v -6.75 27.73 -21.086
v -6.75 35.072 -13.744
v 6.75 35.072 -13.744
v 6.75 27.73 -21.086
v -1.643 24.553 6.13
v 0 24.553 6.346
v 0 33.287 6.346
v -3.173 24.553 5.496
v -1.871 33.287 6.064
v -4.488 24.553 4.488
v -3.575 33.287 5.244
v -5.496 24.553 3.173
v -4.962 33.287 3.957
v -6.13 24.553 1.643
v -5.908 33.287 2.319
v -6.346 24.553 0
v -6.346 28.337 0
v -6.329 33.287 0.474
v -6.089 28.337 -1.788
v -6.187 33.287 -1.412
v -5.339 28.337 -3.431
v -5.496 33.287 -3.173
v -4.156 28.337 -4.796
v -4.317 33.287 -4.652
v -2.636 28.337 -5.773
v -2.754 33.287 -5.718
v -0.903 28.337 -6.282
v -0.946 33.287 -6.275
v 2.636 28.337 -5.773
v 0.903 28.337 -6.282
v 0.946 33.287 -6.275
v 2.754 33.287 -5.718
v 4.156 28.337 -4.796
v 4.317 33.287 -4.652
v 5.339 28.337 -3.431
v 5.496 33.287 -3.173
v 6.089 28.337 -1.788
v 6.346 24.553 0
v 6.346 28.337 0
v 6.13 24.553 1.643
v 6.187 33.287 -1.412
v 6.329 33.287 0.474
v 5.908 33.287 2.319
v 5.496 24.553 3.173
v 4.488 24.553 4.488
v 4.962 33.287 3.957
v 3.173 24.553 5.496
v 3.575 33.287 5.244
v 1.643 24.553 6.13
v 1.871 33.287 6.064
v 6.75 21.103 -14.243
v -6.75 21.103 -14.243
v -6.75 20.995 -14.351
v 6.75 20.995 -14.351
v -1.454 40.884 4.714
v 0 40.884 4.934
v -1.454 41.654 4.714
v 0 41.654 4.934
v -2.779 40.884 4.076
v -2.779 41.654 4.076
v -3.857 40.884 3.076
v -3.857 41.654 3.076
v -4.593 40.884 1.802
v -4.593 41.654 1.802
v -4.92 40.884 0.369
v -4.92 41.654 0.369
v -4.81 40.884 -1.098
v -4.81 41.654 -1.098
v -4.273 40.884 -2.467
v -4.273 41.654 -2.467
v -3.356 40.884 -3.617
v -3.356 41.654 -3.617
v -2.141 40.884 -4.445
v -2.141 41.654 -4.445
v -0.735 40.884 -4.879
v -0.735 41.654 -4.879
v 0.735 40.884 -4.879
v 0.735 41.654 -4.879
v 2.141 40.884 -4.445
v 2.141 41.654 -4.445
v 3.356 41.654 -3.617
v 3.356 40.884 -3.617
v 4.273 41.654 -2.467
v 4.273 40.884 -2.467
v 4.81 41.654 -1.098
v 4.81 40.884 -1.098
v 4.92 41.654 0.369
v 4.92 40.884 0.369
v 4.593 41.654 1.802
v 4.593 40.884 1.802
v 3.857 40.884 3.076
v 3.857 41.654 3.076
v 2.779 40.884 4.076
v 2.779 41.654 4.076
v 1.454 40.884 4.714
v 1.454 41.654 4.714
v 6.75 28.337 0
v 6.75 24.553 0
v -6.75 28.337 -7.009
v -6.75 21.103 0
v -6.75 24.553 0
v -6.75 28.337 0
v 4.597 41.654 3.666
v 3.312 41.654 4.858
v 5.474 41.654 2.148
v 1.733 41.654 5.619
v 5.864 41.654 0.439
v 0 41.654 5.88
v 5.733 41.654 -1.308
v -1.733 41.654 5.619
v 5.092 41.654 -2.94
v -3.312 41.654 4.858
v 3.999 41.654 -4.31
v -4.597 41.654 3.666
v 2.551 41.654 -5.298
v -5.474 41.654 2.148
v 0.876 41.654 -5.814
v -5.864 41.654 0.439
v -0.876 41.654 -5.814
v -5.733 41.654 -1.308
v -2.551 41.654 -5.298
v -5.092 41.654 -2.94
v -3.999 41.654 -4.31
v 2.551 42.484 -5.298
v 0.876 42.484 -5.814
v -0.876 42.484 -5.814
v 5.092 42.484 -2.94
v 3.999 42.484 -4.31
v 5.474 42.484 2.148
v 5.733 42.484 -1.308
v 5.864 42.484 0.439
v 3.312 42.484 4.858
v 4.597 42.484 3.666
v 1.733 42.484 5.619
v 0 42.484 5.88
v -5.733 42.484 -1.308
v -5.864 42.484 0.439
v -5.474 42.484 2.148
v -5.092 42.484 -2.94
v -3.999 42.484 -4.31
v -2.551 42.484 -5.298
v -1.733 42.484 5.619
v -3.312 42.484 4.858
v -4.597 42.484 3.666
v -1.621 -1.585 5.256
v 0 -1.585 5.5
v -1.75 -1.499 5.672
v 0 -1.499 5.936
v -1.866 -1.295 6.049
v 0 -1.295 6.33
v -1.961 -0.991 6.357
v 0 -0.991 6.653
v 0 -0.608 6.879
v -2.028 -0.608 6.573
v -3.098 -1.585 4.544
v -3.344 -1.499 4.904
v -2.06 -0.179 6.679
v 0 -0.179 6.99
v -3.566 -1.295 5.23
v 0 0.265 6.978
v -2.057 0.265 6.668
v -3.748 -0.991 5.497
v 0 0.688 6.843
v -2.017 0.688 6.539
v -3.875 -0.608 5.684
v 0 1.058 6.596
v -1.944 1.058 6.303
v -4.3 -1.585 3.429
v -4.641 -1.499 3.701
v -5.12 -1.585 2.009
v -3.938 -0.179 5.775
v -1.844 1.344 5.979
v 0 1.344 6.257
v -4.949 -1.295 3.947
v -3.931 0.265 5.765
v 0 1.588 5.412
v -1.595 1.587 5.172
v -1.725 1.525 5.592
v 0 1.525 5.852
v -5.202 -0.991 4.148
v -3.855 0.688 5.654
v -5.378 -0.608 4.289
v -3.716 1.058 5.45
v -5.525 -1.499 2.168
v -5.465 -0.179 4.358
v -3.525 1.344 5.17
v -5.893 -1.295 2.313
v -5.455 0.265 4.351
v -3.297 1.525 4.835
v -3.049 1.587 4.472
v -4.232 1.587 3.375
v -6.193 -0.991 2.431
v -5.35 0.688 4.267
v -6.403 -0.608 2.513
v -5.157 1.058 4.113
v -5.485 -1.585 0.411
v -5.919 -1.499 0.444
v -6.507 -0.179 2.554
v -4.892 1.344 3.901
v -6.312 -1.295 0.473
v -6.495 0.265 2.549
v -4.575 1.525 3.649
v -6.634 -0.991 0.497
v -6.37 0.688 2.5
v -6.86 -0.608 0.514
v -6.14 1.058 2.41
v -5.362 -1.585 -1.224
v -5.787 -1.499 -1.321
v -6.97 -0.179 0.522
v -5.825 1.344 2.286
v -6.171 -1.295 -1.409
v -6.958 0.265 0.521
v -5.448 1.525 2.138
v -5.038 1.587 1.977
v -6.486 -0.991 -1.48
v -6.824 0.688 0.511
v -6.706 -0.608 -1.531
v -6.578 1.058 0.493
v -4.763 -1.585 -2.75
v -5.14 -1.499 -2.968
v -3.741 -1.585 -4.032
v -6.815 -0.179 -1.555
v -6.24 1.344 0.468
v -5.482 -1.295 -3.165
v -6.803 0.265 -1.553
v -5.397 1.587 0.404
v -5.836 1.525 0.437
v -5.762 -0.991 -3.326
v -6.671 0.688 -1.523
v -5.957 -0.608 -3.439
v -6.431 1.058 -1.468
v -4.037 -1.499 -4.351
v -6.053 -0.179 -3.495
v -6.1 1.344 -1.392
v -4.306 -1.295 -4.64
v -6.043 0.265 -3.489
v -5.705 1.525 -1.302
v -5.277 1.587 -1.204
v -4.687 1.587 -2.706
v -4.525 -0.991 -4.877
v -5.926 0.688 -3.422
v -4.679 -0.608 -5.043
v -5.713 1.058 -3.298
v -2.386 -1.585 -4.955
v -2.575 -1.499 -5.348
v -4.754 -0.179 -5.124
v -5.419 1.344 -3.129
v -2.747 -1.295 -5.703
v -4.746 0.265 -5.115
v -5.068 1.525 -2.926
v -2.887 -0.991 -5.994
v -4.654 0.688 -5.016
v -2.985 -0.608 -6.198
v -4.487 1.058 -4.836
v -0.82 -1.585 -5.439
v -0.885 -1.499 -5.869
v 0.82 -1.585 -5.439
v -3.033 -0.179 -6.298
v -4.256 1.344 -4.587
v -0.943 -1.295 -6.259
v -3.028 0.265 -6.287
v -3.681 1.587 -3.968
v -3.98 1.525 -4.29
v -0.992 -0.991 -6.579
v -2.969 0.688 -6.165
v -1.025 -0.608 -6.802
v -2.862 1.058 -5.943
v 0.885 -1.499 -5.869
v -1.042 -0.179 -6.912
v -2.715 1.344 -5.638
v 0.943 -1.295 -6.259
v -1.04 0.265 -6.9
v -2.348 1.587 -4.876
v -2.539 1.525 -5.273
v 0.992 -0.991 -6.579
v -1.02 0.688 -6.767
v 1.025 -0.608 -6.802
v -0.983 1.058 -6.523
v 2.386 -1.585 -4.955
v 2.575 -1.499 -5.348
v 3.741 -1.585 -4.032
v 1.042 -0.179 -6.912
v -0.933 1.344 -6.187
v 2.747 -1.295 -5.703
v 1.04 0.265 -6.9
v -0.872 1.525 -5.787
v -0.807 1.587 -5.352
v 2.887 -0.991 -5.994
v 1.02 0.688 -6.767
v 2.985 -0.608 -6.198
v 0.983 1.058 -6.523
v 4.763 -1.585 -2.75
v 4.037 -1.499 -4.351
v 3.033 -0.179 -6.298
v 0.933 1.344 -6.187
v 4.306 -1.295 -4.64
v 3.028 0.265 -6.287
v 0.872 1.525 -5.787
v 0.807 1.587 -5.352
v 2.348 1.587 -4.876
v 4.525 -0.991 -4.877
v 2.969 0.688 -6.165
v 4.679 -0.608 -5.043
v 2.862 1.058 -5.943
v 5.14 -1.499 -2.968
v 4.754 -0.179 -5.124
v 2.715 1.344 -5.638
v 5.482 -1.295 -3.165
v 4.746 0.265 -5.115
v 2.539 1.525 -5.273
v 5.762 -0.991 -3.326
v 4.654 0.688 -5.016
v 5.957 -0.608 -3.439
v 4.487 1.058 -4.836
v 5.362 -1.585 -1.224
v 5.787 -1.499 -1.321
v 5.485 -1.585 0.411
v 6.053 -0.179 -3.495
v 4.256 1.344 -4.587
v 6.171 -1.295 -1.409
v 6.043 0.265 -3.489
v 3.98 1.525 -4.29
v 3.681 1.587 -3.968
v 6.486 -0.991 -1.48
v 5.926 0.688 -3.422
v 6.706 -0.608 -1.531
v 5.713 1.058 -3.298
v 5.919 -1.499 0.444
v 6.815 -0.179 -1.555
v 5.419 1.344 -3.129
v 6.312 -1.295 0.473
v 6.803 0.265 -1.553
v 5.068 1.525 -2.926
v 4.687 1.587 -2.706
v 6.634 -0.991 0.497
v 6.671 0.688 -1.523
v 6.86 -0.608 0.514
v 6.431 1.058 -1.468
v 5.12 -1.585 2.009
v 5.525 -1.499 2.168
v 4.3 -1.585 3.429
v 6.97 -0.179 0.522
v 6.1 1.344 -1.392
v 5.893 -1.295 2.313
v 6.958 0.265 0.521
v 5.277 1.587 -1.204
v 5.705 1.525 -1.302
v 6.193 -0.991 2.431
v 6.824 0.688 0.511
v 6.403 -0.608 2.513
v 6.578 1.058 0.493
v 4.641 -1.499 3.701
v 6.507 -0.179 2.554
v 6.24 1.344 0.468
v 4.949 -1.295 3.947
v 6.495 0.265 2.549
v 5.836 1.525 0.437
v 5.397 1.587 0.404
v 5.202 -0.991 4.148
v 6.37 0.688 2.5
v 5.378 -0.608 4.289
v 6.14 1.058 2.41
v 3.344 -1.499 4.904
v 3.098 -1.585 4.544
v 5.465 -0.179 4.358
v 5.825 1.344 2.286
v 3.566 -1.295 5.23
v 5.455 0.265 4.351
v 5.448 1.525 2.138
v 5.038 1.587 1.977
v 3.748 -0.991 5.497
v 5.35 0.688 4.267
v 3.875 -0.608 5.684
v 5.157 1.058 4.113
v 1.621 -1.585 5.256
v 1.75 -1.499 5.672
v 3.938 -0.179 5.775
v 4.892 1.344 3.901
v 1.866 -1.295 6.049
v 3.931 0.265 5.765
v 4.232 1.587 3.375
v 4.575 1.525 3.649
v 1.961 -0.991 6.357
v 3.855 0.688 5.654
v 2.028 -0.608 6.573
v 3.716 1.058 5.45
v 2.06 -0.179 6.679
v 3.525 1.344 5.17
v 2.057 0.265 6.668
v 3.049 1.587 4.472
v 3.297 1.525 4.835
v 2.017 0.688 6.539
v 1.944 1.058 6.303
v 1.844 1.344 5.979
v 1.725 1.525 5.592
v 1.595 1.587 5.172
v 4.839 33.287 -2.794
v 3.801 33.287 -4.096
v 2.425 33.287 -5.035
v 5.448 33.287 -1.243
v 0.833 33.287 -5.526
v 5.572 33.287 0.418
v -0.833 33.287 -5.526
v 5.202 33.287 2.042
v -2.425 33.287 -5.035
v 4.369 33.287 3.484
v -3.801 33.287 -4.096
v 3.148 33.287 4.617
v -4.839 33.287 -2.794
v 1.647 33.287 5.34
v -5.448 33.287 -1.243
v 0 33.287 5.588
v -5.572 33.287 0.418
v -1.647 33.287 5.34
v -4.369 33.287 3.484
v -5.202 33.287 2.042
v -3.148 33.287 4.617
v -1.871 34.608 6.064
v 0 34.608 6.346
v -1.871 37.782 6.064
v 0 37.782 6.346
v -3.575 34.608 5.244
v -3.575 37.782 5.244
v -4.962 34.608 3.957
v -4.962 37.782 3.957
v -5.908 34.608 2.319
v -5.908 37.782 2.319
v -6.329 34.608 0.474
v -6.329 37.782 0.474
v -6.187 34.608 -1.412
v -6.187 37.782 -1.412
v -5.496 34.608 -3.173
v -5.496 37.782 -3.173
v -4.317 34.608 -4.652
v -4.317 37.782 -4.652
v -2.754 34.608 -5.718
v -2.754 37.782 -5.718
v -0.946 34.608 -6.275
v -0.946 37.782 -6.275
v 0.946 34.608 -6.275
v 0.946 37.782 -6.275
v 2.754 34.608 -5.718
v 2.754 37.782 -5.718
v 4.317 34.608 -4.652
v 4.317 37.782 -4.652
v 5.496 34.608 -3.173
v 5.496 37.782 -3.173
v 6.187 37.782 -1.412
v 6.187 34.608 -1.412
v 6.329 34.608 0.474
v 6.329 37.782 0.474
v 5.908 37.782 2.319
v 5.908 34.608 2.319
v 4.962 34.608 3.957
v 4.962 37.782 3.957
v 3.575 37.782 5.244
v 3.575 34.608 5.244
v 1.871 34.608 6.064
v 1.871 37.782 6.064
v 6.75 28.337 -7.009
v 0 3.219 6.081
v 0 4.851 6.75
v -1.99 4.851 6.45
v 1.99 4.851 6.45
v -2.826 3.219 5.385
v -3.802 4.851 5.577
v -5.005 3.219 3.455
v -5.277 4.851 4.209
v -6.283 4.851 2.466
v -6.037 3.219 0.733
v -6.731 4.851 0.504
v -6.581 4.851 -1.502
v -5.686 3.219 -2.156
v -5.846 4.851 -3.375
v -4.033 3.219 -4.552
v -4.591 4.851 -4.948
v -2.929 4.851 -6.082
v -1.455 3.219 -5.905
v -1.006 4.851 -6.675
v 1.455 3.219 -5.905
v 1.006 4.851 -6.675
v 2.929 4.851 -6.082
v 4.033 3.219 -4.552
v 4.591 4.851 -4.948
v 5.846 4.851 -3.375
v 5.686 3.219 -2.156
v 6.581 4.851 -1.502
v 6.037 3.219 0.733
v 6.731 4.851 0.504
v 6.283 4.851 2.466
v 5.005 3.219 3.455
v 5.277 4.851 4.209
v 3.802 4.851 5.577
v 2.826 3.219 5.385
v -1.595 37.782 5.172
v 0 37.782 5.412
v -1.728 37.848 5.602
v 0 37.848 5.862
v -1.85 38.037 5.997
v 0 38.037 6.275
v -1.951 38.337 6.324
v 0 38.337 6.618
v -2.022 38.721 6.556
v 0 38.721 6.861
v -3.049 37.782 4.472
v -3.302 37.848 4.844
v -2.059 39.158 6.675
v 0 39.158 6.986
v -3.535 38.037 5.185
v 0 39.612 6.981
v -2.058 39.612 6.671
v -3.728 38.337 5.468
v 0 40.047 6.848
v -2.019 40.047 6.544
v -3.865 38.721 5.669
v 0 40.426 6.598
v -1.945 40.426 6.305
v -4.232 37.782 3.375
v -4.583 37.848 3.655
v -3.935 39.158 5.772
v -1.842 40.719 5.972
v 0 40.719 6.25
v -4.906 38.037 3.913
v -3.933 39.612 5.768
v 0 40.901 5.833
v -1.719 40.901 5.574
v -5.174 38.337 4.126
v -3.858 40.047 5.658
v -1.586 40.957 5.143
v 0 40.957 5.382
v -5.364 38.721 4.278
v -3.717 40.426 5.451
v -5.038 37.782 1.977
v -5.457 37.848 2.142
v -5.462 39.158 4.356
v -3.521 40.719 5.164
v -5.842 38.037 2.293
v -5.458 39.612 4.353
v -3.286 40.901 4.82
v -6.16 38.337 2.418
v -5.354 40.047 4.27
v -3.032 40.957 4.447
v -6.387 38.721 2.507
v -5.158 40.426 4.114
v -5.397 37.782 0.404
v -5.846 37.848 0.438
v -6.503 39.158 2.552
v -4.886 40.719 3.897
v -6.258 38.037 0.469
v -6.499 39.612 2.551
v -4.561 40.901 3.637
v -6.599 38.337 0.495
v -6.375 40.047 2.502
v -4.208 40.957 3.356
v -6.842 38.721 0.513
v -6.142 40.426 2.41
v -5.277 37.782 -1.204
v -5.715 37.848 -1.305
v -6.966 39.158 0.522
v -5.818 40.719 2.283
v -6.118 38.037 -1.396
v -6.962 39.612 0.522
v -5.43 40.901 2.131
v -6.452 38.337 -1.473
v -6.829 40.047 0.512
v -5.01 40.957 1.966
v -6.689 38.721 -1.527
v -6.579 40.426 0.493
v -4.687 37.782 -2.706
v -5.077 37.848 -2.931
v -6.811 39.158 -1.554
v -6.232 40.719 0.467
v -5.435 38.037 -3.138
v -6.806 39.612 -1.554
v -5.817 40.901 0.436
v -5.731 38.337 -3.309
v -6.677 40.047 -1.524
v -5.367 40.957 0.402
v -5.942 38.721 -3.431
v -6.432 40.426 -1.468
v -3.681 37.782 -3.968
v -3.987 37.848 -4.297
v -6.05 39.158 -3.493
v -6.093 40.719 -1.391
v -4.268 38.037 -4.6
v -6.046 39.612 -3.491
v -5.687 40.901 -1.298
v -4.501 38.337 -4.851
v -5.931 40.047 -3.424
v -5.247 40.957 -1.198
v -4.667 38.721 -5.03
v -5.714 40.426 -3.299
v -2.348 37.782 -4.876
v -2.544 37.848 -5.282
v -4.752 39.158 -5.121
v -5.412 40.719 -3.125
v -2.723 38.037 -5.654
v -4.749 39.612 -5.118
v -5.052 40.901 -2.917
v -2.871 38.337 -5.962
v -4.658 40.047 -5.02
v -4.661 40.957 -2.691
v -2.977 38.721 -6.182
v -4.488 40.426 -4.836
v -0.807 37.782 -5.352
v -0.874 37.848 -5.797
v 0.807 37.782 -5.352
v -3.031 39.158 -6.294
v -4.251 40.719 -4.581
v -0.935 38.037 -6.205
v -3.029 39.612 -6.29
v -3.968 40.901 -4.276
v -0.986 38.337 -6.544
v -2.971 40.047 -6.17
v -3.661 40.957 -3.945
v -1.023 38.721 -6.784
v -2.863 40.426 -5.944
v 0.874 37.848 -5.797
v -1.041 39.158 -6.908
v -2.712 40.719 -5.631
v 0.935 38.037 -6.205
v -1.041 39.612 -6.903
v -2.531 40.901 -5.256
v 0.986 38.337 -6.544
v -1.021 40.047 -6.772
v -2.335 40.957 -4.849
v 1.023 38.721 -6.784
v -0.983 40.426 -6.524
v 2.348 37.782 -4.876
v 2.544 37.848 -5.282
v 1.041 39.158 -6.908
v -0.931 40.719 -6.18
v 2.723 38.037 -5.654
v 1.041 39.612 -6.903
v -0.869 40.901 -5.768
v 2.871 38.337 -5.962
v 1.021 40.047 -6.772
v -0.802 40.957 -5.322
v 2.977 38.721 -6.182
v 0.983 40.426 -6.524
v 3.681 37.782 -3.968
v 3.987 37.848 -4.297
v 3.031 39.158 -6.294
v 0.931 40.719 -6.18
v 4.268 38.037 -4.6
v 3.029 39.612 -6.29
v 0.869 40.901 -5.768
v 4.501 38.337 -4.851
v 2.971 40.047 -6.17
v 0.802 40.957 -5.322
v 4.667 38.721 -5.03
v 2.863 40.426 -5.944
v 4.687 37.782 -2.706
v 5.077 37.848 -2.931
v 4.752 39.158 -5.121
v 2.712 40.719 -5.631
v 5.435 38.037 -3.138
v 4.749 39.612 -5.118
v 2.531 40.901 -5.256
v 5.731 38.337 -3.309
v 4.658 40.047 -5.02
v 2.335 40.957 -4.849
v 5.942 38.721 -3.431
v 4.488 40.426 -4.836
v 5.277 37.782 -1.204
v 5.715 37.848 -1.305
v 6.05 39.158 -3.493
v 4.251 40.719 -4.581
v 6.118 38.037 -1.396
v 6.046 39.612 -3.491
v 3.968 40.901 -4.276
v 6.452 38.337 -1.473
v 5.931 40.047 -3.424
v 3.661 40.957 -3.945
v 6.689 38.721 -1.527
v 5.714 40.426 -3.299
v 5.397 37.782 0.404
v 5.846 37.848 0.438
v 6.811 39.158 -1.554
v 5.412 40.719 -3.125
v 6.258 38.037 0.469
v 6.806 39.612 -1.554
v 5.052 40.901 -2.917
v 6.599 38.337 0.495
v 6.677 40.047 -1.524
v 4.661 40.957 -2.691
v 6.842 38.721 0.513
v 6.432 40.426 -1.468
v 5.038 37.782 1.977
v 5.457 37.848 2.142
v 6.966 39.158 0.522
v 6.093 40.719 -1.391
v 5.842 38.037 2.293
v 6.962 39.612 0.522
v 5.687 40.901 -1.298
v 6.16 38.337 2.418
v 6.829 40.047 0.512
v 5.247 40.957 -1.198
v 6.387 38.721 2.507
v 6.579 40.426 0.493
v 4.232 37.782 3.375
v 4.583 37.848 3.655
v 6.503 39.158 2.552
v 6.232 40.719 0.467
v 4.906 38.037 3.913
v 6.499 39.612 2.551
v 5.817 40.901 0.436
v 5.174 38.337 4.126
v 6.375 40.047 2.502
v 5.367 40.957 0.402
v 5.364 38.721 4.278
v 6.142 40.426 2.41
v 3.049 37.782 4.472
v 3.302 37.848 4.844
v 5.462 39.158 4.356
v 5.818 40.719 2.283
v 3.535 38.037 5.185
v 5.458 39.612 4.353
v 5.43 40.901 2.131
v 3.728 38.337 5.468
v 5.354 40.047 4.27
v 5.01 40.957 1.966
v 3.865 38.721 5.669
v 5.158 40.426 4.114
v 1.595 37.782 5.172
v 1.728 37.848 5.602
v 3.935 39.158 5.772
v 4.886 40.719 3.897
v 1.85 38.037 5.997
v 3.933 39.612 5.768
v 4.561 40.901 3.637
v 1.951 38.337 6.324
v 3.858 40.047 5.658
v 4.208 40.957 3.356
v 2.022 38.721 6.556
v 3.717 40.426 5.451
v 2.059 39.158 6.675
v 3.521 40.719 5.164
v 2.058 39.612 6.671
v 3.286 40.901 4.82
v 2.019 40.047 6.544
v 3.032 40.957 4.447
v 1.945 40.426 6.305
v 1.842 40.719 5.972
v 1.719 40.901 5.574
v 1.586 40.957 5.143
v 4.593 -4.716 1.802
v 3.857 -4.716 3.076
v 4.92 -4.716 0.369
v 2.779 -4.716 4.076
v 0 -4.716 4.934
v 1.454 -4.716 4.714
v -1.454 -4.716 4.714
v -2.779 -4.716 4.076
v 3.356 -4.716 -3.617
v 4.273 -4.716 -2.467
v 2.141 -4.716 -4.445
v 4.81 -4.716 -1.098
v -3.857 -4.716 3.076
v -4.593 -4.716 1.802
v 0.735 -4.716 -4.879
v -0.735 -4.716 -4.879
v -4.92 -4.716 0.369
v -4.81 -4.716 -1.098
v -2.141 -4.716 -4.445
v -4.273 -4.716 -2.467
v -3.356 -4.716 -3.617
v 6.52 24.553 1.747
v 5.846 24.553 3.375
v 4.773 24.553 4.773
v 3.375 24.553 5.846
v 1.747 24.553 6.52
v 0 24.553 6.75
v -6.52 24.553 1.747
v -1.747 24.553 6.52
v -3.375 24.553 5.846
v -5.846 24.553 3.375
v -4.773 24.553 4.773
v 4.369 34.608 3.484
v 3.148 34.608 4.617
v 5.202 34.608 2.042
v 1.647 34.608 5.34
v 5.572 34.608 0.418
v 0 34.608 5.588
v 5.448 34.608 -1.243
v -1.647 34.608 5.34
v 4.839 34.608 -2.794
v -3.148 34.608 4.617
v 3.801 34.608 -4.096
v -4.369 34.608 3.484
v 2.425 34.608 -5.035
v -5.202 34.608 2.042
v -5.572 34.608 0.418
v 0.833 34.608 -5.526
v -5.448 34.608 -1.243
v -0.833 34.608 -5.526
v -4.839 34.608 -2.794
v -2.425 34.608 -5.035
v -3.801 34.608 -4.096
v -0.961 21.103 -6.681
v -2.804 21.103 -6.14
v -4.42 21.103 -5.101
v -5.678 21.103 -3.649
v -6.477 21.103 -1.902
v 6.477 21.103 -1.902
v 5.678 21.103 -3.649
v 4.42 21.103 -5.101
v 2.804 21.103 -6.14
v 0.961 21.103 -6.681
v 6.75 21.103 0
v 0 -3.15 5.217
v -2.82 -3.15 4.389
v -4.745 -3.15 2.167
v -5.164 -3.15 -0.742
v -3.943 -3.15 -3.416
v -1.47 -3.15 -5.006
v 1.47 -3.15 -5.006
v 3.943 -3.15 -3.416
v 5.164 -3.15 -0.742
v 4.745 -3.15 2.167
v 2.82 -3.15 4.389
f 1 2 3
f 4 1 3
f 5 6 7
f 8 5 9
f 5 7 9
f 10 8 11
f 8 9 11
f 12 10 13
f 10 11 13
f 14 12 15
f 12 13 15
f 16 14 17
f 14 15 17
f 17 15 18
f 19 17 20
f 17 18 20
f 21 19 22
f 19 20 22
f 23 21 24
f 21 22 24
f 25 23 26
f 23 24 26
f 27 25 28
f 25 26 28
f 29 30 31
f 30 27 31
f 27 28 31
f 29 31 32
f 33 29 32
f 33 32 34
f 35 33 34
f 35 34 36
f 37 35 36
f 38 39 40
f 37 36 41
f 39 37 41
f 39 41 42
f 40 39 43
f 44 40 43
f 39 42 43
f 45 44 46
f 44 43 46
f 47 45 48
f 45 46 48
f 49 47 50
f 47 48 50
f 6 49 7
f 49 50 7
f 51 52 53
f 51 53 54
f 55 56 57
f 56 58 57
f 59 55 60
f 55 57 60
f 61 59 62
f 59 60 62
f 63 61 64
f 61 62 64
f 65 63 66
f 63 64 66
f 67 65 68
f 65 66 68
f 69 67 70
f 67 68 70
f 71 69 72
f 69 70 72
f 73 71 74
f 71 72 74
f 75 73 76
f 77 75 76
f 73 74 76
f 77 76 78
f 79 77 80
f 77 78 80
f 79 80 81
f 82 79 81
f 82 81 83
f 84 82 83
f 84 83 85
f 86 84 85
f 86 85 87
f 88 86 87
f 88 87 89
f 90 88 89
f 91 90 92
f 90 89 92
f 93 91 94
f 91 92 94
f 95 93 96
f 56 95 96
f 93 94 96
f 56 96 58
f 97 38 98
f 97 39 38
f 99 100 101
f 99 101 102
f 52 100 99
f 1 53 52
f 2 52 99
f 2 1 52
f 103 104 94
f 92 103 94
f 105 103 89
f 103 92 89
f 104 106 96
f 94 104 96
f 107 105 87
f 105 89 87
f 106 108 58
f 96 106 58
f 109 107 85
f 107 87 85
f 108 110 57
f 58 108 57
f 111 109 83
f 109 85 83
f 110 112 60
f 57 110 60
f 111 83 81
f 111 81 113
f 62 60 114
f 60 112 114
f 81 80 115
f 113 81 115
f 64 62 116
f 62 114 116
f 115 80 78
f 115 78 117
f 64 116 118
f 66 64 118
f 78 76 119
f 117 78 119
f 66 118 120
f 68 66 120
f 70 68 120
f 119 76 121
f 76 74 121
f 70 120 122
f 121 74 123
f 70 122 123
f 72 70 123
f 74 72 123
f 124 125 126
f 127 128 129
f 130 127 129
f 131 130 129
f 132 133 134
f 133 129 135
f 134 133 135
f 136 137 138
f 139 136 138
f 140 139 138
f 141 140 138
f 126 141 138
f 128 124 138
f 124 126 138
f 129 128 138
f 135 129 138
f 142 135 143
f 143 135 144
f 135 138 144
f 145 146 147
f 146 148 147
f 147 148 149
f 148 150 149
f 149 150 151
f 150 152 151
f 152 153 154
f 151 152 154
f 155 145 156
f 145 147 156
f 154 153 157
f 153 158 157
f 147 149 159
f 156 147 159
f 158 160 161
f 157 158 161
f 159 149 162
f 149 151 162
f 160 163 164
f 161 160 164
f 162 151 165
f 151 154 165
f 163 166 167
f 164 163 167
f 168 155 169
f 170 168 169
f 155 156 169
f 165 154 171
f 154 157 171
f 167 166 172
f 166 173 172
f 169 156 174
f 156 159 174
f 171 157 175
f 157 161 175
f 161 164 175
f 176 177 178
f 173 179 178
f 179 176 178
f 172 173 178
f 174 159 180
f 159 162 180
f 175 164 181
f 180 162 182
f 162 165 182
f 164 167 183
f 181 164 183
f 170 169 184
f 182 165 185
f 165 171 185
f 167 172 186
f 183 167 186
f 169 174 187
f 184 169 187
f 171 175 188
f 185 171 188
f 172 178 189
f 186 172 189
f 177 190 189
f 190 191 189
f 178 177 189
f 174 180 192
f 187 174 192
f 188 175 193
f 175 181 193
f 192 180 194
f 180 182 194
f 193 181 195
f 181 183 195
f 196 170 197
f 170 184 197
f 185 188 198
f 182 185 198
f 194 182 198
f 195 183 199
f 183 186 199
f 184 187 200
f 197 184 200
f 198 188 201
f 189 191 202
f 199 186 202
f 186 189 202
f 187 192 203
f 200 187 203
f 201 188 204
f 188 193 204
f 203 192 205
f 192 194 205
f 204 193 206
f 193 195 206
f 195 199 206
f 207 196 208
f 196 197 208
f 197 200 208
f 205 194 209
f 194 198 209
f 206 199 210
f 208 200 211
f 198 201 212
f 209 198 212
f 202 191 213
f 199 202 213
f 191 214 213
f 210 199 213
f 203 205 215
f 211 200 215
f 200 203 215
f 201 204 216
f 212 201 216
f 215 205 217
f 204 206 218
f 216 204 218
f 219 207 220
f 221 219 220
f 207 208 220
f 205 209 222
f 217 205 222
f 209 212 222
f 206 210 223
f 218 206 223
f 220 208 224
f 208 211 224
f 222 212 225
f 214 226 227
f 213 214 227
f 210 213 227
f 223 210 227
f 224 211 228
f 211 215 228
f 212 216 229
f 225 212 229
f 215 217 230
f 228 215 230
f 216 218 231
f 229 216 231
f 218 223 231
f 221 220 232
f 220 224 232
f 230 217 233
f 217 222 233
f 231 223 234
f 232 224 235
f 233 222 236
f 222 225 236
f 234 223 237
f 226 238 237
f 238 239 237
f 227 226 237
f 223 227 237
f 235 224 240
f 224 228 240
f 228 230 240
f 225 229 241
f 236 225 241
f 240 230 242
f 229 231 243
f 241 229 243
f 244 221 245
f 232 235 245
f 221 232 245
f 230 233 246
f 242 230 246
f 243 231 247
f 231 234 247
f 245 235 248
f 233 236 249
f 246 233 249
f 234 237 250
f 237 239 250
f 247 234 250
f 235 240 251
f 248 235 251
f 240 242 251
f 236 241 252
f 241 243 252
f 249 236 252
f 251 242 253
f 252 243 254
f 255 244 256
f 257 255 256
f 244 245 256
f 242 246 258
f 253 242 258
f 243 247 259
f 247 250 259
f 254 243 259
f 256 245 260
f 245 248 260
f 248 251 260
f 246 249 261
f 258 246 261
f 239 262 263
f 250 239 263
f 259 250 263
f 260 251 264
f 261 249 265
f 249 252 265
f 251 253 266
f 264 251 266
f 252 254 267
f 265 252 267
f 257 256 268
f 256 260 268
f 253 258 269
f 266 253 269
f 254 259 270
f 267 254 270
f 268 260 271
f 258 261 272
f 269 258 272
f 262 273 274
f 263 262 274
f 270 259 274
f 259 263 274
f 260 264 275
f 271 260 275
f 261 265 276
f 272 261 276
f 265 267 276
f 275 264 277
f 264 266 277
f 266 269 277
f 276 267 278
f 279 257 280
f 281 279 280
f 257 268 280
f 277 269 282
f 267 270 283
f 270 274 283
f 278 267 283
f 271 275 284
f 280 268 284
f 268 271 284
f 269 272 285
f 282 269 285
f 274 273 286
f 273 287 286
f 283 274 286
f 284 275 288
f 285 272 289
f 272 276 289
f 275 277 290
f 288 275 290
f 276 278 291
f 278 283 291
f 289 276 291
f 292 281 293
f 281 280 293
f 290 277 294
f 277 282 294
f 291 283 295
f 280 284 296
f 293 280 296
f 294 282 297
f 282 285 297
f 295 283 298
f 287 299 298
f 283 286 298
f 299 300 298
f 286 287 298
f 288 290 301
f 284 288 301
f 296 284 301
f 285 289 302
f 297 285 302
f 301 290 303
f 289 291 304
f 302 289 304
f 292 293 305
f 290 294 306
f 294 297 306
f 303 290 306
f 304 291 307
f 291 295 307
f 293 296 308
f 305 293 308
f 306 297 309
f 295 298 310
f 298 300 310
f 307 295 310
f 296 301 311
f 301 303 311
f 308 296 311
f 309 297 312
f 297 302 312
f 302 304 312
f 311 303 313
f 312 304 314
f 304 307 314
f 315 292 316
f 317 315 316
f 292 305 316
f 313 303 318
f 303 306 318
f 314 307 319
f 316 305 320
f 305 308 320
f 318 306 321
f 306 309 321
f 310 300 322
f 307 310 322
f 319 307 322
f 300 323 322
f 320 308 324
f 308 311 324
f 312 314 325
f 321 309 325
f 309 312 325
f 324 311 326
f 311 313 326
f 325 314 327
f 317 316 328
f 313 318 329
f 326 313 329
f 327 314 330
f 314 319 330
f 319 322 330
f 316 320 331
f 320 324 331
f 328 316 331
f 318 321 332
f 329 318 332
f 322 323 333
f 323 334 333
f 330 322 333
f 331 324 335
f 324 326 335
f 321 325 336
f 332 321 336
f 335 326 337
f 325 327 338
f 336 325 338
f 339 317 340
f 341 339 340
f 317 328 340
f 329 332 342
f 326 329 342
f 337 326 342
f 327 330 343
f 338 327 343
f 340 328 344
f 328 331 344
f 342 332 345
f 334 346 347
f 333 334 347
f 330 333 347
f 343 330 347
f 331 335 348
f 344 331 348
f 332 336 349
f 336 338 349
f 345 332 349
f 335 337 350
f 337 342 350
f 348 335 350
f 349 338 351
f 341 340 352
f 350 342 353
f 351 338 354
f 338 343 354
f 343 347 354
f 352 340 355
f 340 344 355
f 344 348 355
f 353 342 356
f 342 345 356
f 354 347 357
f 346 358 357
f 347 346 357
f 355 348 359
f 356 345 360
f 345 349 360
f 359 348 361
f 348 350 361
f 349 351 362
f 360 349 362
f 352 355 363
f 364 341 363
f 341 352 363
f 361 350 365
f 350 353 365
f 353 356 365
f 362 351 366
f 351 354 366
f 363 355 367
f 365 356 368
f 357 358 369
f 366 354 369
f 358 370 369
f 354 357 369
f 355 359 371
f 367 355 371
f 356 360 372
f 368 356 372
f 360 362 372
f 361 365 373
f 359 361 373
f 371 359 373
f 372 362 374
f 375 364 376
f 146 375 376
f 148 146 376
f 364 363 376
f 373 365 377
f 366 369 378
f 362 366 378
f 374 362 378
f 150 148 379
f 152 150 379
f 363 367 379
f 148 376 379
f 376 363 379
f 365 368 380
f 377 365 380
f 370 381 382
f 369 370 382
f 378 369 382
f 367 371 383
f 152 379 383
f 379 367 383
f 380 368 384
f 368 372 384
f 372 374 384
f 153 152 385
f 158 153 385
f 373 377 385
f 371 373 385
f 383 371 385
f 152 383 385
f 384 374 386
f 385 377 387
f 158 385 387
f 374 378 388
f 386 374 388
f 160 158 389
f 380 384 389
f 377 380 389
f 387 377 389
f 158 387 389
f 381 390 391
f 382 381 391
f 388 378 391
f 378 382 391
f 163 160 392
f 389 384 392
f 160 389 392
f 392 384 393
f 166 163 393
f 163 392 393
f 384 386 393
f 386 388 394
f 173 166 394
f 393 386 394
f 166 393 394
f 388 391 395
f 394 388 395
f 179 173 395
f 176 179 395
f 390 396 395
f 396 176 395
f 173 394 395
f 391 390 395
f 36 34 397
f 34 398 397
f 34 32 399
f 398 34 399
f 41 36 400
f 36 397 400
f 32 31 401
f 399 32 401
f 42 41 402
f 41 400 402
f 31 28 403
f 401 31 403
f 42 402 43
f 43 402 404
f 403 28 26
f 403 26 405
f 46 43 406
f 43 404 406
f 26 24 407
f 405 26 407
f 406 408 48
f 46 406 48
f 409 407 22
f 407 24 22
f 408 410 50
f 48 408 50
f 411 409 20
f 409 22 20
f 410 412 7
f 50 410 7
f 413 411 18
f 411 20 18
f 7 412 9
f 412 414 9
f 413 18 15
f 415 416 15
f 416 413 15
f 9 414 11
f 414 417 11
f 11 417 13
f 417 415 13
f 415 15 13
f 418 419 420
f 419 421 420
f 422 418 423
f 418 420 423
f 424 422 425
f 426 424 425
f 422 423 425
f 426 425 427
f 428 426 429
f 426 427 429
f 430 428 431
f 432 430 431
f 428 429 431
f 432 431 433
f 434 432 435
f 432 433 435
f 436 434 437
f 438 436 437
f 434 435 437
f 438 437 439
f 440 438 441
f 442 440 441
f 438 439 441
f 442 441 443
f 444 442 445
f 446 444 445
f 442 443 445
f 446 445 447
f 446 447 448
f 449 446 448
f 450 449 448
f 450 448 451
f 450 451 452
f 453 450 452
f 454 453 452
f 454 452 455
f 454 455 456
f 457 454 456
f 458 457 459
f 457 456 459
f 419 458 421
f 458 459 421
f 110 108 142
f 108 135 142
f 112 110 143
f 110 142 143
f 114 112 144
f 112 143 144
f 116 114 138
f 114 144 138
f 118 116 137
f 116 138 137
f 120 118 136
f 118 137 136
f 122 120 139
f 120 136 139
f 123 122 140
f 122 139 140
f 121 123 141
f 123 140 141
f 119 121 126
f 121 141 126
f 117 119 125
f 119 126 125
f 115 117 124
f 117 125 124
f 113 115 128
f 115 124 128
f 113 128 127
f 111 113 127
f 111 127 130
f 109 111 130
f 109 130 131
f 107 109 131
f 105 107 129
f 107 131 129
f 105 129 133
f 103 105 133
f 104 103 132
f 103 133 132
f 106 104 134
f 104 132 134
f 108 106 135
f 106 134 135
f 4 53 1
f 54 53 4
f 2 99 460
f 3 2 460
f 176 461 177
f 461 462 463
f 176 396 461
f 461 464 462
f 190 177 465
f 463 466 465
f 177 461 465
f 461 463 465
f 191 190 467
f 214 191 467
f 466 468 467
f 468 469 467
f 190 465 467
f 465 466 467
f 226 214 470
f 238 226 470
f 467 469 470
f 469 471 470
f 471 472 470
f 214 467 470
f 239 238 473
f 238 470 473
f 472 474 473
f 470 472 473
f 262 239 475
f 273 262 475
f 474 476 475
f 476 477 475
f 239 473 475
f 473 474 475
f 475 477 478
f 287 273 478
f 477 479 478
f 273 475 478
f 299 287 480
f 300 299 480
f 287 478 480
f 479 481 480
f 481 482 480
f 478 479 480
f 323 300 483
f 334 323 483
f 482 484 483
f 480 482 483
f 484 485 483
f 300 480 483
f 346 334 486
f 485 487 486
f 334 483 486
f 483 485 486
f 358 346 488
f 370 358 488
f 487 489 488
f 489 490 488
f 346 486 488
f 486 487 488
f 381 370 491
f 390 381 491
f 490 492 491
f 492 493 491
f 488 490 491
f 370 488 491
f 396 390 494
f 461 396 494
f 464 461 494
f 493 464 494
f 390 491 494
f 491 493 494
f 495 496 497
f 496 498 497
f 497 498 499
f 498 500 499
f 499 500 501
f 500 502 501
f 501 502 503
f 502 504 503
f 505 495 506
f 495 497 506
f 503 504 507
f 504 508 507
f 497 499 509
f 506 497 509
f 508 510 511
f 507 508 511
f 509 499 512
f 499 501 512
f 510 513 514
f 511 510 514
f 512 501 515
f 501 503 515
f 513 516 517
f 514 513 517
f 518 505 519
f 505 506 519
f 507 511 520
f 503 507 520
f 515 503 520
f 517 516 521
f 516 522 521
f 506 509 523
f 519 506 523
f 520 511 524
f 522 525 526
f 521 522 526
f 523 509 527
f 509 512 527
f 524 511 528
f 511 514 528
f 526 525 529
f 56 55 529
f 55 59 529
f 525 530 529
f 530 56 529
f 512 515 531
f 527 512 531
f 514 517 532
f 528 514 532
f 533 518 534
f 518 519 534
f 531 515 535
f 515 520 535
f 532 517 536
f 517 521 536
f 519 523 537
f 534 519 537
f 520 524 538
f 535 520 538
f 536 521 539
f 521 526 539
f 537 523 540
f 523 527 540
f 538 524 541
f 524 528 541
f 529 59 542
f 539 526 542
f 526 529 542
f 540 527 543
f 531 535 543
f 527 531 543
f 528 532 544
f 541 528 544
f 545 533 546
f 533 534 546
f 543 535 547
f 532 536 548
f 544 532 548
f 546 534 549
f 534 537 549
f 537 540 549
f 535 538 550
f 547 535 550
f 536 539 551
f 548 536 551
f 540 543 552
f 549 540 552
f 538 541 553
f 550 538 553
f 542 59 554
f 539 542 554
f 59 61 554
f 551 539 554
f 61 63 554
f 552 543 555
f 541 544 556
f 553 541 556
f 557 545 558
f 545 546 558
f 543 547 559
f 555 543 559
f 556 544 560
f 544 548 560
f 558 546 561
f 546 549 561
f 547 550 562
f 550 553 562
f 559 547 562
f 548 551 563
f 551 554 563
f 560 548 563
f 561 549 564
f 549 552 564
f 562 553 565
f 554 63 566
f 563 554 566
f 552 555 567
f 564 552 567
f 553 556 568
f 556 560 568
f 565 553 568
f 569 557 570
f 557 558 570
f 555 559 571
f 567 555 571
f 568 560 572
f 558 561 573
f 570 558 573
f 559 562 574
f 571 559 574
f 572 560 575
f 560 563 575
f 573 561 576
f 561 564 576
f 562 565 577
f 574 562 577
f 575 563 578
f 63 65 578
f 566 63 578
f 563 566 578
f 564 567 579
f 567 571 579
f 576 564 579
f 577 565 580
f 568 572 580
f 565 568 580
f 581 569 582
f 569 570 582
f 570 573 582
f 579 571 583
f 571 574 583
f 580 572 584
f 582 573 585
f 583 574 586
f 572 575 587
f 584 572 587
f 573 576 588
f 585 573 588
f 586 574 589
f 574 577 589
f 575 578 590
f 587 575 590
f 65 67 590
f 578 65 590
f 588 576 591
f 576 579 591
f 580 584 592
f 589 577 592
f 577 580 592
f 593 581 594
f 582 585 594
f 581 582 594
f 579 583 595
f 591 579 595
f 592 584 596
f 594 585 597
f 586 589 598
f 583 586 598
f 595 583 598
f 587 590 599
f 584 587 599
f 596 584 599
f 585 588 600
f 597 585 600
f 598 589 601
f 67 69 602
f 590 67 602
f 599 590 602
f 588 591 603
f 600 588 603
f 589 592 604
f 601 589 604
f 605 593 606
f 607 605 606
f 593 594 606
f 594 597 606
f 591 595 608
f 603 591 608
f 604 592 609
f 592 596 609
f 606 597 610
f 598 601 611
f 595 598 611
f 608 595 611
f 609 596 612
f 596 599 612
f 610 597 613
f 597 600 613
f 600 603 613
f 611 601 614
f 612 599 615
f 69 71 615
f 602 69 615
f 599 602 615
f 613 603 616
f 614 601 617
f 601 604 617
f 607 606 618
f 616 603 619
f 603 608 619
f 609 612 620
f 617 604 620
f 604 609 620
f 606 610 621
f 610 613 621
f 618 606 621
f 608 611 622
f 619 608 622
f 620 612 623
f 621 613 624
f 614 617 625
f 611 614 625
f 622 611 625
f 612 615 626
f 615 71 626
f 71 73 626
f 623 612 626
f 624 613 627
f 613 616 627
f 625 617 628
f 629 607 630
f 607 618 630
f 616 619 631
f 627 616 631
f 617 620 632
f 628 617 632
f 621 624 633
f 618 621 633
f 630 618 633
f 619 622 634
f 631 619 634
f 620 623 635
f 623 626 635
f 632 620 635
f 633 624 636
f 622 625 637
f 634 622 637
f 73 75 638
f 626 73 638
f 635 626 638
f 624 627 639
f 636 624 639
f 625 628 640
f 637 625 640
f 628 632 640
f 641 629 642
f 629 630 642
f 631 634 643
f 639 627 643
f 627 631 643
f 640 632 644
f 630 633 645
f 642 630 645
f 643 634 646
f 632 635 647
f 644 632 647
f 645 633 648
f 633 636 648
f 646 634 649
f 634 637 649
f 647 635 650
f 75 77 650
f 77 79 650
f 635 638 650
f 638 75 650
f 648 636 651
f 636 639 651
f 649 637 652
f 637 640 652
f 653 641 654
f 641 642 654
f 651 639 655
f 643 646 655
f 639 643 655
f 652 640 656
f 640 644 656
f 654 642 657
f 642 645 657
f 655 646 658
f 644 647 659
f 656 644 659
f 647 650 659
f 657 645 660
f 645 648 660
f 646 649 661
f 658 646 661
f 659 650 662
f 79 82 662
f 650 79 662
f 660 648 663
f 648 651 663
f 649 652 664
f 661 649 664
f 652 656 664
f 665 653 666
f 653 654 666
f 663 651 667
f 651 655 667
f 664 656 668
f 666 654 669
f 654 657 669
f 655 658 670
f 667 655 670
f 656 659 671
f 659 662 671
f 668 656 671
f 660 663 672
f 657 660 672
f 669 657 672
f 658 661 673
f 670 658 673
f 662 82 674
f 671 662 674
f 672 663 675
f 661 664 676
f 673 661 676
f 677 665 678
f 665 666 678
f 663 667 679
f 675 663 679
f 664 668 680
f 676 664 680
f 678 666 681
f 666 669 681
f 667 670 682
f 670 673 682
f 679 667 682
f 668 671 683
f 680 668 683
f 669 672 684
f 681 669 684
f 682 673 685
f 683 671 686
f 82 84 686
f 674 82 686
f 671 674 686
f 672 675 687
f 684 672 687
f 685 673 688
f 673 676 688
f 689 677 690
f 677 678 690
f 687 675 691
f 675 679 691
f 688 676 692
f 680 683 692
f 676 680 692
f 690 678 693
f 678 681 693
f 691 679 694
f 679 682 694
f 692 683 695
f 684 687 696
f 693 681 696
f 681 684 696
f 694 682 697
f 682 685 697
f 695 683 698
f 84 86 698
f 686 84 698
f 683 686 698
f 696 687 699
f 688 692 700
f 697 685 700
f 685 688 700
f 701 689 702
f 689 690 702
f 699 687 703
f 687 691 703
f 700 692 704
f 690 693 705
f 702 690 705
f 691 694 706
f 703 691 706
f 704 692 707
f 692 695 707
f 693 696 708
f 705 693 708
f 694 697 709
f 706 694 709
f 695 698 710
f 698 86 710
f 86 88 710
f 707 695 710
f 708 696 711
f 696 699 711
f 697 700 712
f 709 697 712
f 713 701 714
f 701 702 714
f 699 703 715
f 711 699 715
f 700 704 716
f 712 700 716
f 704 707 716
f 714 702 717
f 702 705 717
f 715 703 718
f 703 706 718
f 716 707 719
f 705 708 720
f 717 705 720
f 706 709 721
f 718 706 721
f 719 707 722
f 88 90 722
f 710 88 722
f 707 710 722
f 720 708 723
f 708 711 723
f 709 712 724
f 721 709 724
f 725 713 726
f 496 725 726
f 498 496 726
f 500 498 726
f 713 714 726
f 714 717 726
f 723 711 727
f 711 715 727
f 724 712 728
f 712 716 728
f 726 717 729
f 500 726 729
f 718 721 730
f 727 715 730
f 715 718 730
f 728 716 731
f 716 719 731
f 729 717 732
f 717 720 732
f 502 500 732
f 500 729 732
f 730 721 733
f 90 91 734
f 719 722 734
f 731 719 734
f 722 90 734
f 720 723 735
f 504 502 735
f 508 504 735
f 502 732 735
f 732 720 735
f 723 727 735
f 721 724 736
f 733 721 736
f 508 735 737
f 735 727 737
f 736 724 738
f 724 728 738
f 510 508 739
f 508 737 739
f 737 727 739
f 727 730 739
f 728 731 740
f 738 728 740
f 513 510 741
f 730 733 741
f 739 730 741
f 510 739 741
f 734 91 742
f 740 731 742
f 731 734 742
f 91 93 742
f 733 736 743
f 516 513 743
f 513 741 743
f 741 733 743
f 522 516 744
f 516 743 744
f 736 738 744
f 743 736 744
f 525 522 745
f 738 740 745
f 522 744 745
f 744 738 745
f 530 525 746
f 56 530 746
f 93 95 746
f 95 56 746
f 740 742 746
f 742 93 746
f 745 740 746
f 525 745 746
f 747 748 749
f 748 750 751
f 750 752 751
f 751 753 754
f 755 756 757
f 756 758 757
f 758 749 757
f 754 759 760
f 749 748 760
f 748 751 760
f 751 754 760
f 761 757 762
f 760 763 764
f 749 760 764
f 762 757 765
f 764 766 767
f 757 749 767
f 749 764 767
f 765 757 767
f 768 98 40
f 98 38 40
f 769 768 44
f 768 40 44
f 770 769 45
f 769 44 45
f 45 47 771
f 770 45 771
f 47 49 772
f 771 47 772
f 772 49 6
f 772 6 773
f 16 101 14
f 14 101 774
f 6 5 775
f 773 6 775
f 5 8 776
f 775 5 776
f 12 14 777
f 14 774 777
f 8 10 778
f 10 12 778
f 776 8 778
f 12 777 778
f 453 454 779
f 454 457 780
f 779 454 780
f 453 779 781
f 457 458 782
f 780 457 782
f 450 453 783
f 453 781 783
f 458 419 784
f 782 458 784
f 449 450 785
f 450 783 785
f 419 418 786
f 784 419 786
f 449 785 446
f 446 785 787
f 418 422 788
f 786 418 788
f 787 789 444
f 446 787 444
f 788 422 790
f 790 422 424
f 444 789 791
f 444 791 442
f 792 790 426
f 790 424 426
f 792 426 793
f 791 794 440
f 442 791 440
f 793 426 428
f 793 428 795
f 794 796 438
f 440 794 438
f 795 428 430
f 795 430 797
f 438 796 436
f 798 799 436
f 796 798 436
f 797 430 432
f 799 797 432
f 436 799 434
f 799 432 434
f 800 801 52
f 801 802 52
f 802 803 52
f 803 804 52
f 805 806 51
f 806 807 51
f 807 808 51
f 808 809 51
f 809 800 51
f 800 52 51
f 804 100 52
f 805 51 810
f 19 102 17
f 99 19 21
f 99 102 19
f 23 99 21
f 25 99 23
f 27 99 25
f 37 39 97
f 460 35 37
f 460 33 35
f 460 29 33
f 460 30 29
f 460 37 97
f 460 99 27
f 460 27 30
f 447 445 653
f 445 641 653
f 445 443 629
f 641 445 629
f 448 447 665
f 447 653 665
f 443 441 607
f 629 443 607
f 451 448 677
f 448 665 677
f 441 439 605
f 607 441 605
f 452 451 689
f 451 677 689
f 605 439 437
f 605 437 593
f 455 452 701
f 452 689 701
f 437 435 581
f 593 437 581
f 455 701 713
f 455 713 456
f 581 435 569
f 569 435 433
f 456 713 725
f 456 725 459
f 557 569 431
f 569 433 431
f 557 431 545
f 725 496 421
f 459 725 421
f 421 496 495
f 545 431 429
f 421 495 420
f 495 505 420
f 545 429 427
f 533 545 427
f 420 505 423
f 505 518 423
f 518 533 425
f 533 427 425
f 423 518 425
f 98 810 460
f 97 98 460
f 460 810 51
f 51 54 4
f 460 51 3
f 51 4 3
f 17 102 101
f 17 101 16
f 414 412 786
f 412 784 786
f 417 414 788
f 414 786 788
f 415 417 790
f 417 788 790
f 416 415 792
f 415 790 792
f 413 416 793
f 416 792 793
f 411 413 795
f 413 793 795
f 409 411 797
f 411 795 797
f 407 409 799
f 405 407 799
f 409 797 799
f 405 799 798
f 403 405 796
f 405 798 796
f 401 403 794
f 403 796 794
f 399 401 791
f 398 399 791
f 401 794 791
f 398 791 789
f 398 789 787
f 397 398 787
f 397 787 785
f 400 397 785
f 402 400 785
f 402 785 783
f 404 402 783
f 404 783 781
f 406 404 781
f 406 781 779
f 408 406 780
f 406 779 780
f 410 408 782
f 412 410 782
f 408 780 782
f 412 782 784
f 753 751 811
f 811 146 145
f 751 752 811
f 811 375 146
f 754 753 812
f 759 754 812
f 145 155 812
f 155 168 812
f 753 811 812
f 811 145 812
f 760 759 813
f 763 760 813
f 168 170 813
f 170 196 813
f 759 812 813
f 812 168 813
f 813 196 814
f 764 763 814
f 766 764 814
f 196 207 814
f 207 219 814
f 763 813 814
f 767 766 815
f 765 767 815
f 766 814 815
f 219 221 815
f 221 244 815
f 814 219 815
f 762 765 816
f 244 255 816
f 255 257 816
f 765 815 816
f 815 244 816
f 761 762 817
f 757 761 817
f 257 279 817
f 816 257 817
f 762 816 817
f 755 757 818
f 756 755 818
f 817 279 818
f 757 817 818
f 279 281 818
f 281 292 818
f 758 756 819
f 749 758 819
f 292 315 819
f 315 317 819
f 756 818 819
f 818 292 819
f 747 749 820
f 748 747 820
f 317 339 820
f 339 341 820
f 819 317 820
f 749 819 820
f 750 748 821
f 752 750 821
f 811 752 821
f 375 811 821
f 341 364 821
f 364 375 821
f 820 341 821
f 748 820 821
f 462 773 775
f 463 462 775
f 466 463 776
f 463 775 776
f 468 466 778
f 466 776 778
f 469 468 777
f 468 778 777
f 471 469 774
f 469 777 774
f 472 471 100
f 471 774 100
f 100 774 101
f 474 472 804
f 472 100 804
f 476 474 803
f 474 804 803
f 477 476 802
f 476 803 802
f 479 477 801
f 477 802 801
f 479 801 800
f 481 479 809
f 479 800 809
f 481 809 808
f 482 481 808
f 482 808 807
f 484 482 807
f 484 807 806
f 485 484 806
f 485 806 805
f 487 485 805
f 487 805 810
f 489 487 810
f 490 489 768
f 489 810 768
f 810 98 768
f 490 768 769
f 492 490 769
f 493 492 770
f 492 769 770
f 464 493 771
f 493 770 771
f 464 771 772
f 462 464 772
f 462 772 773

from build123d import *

# Parameters (mm, degrees)
SKETCH3_W           = 13.5
SKETCH3_H           = 10.382914324
BOSS_EXTRUDE1_DEPTH = 9.525
BOSS_EXTRUDE2_START = -14.243138
SKETCH4_W           = 13.5
SKETCH4_H           = 7.234030804
BOSS_EXTRUDE2_DEPTH = 14.243138


with BuildPart() as part:
    # Sketch1 → Revolve1 (revolve)
    with BuildSketch(Plane(origin=(0, 0, 0), x_dir=(0, 0, -1), z_dir=(1, 0, 0))):
        with BuildLine():
            Line((0, 42.48431703), (0, -4.71568297))
            Line((0, -4.71568297), (-4.933645932, -4.71568297))
            Line((-4.933645932, -4.71568297), (-5.5, -1.585086748))
            ThreePointArc((-5.5, -1.585086748), (-6.999396572, 0.043766636), (-5.4125, 1.5875))
            Line((-5.4125, 1.5875), (-6.75, 4.851437808))
            Line((-6.75, 4.851437808), (-6.75, 24.552512087))
            Line((-6.75, 24.552512087), (-6.346345985, 24.552512087))
            Line((-6.346345985, 24.552512087), (-6.346345985, 33.2867))
            Line((-6.346345985, 33.2867), (-5.588, 33.2867))
            Line((-5.588, 33.2867), (-5.588, 34.6075))
            Line((-5.588, 34.6075), (-6.346345985, 34.6075))
            Line((-6.346345985, 34.6075), (-6.346345985, 37.7825))
            Line((-6.346345985, 37.7825), (-5.4125, 37.7825))
            ThreePointArc((-5.4125, 37.7825), (-6.981405369, 39.612264718), (-4.933645932, 40.883557079))
            Line((-4.933645932, 40.883557079), (-4.933645932, 41.654223502))
            Line((-4.933645932, 41.654223502), (-5.880026524, 41.654223502))
            Line((-5.880026524, 41.654223502), (-5.880026524, 42.48431703))
            Line((-5.880026524, 42.48431703), (0, 42.48431703))
        make_face()
    revolve(axis=Axis((0, 42.48431703, 0), (0, -1, 0)))



with BuildPart() as body_2:
    # Sketch3 → Boss-Extrude1 (new body)
    with BuildSketch(Plane(origin=(0, 17.673005927, -17.673005927), x_dir=(1, 0, 0), z_dir=(0, -0.707106781, 0.707106781))):
        with Locations((0, 9.889573108)):
            Rectangle(SKETCH3_W, SKETCH3_H)
    extrude(amount=-BOSS_EXTRUDE1_DEPTH)


with BuildPart() as part_1:
    add(part.part)

    add(body_2.part)  # Boss-Extrude2 merges body 2
    # Sketch4 → Boss-Extrude2 (add)
    with BuildSketch(Plane.XY.offset(BOSS_EXTRUDE2_START)):
        with Locations((0, 24.719889296)):
            Rectangle(SKETCH4_W, SKETCH4_H)
    extrude(amount=BOSS_EXTRUDE2_DEPTH)


solid = part_1.part
